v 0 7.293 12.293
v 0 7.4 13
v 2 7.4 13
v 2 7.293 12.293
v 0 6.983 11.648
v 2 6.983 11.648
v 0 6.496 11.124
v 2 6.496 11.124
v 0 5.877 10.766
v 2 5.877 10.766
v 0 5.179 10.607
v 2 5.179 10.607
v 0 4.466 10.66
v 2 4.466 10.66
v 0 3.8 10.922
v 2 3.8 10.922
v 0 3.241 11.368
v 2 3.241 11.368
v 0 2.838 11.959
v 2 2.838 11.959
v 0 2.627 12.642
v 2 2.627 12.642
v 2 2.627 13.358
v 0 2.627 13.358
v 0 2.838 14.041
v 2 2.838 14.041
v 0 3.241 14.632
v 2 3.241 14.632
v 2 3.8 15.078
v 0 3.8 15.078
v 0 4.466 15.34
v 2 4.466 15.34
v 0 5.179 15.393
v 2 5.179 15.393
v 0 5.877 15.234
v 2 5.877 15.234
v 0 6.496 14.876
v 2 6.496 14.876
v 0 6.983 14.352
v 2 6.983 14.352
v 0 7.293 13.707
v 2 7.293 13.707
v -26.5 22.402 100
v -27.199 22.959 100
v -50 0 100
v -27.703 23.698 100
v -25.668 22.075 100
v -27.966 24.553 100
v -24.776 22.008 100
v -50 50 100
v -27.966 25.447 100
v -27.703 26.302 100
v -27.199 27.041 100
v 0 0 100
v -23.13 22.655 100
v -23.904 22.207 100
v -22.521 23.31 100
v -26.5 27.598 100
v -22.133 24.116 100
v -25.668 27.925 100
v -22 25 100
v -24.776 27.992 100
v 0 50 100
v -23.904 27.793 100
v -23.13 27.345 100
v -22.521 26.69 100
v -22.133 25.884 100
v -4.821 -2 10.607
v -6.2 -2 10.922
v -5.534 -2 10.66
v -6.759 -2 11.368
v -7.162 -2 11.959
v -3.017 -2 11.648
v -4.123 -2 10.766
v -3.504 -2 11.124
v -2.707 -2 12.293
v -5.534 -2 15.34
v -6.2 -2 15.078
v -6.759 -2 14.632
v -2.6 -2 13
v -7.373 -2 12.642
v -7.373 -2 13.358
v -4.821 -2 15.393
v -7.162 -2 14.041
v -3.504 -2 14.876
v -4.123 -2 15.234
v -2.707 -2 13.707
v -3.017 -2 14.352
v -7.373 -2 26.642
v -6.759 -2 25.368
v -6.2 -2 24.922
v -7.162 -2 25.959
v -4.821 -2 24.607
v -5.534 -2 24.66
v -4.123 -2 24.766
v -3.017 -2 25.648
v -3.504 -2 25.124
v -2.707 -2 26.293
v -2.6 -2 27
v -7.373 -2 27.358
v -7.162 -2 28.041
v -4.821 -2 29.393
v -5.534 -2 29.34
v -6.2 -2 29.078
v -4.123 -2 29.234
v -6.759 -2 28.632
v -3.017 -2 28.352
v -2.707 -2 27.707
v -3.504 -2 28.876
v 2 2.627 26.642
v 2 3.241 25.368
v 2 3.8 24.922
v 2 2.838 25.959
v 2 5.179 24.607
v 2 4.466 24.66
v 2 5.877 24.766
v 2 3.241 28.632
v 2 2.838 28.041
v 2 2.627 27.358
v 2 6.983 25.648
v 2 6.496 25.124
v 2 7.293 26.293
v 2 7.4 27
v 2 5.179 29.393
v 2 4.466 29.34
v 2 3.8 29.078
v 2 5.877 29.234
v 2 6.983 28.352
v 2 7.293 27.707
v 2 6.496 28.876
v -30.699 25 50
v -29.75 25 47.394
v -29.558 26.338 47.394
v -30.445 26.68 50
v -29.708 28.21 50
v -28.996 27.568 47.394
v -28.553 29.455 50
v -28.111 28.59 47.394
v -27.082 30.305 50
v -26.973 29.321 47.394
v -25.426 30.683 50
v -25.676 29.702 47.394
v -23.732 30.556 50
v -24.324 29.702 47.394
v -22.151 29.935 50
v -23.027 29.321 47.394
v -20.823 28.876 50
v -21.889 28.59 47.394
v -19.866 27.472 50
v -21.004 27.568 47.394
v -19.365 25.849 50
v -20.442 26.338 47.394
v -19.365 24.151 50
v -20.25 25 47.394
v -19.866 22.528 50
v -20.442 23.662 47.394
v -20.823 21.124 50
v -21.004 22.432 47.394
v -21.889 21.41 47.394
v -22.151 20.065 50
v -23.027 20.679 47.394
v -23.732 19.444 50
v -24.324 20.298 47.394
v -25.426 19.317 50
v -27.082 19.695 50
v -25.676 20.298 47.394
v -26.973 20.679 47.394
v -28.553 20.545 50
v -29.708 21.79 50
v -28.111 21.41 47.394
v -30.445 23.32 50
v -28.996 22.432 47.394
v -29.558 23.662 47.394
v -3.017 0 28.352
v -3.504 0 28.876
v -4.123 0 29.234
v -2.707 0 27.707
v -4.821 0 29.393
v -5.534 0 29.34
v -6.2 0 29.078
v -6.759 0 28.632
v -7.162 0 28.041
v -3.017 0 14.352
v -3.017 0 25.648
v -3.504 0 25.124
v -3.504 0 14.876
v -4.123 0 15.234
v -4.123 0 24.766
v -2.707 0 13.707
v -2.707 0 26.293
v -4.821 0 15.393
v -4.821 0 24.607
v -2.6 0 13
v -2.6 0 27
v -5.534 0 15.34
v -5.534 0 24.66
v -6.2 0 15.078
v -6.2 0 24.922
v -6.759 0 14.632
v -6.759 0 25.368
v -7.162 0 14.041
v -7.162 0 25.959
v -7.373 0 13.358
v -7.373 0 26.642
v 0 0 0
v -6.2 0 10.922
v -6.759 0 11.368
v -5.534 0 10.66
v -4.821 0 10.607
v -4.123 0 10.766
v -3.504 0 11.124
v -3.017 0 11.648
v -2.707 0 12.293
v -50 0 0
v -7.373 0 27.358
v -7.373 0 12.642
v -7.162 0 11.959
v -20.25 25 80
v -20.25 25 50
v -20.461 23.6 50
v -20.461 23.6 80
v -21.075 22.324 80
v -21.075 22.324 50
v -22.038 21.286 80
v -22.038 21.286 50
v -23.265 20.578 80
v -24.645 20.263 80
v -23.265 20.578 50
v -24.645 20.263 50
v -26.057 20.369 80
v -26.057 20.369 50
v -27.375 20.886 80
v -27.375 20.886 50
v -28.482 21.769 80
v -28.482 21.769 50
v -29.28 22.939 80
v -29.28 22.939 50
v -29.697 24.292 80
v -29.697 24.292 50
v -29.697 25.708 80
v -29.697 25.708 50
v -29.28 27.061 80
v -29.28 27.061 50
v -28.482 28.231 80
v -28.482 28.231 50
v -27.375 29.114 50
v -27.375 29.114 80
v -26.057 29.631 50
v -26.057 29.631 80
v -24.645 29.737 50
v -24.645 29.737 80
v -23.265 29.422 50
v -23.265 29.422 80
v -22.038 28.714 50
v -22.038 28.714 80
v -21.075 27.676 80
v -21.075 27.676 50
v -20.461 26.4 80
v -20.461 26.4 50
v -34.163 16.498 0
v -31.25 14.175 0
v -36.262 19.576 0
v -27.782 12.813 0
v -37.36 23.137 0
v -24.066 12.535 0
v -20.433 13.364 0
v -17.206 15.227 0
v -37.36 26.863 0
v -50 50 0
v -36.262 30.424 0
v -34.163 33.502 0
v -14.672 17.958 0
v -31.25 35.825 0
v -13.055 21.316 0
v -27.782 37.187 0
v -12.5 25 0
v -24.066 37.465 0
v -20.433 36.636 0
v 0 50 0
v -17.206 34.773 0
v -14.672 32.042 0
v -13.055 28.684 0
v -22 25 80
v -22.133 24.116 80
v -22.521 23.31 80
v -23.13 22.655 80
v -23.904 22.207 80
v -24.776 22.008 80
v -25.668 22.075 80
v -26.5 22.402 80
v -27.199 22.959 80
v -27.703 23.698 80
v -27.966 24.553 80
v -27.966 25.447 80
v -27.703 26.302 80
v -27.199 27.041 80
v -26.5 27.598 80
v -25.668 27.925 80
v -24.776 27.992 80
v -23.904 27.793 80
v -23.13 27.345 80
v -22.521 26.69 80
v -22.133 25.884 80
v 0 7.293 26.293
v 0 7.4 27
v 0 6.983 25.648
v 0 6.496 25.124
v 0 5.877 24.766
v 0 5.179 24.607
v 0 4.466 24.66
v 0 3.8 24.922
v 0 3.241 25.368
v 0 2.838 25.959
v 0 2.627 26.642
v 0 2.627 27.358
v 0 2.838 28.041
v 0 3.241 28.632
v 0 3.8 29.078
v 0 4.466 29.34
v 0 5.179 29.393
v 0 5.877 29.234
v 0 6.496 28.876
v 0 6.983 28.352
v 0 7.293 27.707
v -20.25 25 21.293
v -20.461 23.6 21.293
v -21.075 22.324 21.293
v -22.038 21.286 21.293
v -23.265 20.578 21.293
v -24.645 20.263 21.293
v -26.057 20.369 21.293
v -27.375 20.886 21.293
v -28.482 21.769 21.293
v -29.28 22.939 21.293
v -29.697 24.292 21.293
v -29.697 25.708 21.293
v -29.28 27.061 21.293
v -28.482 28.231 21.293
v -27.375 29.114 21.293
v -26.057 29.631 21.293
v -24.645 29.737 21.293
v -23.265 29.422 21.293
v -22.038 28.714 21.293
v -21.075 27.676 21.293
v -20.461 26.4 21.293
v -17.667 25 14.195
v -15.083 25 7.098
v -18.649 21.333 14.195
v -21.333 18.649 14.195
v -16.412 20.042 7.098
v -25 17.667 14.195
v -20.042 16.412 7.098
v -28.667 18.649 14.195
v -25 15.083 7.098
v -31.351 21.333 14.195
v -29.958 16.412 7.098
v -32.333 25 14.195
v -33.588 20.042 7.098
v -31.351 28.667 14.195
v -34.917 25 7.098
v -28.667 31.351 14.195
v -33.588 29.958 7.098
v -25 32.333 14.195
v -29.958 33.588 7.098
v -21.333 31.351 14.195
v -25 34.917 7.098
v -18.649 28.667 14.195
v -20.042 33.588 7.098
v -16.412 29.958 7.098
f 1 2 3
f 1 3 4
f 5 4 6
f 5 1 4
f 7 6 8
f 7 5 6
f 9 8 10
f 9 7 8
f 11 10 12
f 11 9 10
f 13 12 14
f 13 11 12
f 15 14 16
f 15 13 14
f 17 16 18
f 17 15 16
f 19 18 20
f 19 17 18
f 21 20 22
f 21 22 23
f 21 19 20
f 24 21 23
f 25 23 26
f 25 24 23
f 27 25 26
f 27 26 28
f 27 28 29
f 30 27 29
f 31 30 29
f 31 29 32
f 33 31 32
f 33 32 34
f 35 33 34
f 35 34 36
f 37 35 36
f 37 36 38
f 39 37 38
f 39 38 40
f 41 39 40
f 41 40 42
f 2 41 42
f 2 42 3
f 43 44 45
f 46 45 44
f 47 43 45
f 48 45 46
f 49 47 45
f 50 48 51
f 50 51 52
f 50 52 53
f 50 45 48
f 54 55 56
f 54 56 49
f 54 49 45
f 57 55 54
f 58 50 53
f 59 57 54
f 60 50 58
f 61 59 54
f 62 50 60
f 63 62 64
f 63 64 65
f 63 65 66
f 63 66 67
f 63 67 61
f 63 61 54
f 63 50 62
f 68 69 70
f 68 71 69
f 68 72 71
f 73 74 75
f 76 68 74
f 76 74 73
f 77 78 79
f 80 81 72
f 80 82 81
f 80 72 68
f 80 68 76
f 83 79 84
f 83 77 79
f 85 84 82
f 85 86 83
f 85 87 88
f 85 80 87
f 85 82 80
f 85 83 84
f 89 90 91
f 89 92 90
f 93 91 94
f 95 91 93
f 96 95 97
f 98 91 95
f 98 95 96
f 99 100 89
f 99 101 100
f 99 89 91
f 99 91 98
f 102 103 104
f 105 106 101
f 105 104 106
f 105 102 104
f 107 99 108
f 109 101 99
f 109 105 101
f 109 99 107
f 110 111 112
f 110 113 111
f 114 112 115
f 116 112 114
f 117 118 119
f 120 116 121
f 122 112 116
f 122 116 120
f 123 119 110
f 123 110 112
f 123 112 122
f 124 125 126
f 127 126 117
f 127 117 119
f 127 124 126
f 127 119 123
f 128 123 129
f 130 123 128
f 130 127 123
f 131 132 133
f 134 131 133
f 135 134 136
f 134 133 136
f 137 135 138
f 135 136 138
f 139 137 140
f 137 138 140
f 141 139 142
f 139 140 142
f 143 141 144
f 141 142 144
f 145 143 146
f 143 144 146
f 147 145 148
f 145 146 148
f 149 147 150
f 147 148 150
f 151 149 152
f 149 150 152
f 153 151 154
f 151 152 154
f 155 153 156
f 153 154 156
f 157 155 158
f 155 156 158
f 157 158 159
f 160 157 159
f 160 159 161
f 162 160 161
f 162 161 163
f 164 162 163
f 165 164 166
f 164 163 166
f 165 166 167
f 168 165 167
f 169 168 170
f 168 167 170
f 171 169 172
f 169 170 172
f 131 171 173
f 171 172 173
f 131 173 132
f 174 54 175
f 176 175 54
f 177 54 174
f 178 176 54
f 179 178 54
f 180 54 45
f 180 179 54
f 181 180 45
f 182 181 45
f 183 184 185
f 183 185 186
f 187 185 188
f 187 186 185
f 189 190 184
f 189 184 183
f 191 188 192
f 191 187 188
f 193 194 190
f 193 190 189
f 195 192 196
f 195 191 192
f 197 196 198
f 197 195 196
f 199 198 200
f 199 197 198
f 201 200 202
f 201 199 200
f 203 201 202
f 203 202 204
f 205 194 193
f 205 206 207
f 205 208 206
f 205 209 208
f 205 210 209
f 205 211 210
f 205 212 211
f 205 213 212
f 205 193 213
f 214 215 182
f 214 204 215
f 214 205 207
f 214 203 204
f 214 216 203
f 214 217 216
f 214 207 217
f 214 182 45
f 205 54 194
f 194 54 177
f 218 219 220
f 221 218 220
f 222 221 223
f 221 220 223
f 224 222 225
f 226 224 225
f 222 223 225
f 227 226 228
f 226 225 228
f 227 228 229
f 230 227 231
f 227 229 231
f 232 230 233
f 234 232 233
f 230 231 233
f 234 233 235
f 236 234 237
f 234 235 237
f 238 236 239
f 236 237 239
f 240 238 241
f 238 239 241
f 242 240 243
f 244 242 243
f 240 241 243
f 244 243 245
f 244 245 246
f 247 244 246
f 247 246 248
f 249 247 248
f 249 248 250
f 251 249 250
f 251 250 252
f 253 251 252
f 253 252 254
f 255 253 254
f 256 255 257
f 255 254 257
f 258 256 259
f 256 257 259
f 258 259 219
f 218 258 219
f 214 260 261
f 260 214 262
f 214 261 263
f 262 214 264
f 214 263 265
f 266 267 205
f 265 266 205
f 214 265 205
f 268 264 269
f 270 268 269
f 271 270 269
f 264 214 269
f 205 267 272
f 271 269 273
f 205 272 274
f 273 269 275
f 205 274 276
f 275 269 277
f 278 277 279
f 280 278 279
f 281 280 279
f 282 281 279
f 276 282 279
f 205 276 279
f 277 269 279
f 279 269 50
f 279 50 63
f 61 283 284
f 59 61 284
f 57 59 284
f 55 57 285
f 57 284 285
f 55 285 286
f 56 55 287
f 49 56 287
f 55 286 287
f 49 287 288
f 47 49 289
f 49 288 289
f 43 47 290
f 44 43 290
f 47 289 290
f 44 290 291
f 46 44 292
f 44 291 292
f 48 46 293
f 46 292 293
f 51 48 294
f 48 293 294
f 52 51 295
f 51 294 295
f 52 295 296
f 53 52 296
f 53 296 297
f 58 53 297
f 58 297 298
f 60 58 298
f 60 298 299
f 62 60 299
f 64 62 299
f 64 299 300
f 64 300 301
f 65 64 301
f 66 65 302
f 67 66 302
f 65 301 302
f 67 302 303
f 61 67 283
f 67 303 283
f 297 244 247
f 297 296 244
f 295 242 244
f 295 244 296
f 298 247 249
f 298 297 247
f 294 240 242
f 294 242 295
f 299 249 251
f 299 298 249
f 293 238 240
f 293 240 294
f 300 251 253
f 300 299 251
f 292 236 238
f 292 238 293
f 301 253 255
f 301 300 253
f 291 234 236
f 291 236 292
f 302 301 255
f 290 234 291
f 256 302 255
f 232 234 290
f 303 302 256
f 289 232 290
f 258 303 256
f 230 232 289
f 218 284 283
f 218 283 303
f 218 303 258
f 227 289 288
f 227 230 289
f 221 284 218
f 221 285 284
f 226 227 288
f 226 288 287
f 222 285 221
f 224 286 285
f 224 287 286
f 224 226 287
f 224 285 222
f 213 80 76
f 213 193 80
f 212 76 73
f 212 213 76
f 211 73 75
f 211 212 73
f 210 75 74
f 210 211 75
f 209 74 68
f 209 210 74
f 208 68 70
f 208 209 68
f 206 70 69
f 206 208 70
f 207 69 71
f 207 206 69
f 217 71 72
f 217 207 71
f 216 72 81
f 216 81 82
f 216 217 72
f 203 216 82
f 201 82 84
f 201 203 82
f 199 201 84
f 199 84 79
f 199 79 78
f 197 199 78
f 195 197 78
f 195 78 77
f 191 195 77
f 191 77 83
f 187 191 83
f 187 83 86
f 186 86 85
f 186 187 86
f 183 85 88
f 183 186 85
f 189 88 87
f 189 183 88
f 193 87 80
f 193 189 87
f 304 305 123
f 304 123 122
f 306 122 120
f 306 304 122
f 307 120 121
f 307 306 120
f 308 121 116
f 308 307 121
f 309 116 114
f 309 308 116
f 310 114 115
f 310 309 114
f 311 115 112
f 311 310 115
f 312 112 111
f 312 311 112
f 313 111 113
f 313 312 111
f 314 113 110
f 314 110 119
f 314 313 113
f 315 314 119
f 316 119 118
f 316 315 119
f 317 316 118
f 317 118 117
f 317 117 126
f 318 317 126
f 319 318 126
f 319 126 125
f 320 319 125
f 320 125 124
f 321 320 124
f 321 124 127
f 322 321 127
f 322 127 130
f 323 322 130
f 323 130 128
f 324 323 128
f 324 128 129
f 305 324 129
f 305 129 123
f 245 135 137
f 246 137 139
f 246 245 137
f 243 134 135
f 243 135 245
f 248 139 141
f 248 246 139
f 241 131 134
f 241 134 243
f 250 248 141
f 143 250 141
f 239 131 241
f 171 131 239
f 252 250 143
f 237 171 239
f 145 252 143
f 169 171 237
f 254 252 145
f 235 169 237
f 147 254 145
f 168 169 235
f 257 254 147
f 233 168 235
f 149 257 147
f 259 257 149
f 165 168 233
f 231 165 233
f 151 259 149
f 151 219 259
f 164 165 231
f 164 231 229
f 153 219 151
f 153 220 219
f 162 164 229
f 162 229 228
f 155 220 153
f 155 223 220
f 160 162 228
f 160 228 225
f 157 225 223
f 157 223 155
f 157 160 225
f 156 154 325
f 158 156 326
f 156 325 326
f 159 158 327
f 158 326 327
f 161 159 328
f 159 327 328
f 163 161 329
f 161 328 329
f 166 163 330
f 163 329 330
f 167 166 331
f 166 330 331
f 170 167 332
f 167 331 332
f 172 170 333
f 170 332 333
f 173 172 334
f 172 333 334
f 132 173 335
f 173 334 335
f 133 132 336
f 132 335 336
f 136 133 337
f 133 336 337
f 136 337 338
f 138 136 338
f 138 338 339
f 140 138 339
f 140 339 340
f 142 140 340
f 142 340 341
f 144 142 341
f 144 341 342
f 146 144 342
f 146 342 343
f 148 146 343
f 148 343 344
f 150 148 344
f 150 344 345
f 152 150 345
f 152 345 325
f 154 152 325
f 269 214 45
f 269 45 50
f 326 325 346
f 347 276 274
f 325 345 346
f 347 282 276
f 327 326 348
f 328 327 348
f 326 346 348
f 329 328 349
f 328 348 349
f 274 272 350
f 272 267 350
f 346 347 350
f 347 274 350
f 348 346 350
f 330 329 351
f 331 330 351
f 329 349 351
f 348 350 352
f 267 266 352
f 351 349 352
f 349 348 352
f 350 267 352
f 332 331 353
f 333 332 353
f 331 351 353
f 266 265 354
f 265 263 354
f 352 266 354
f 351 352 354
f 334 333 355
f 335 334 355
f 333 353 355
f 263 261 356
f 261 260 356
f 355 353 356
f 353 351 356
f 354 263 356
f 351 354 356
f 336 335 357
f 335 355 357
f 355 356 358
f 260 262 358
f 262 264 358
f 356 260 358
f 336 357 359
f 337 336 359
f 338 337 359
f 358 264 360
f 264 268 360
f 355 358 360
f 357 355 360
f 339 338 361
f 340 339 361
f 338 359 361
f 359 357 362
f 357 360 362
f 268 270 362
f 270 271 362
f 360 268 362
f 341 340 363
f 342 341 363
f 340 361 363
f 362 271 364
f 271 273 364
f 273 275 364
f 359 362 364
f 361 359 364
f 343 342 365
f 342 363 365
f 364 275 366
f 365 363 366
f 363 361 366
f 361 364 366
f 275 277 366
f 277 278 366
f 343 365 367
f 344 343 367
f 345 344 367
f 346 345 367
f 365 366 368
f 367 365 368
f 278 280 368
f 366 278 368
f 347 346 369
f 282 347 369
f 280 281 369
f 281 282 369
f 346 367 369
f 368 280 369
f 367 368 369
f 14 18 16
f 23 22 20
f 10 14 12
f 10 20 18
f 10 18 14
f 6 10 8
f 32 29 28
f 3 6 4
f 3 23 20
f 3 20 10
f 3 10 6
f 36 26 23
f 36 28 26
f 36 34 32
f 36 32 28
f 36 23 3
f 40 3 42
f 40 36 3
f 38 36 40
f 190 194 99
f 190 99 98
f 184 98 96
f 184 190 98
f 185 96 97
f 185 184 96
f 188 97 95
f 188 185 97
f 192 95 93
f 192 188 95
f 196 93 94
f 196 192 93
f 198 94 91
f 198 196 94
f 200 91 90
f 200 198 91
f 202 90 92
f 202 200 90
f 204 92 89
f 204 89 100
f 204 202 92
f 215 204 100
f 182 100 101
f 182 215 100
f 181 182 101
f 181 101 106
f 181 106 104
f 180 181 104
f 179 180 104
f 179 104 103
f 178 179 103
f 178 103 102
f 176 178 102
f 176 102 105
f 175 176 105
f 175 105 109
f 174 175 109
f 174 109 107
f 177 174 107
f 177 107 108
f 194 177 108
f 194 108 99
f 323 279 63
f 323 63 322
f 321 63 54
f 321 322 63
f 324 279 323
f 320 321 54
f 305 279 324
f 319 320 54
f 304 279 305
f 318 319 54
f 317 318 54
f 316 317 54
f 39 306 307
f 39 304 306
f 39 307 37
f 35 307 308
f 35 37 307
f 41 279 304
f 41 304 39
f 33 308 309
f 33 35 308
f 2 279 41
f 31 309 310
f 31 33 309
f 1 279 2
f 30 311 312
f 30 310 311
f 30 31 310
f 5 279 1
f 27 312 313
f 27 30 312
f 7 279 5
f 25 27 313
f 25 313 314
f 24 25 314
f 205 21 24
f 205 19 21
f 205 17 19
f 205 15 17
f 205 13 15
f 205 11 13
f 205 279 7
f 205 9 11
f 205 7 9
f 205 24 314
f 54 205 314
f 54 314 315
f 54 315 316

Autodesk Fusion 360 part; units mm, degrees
sketch "Sketch1" plane through (0, 0, 0) normal (0, 0, 1) x (1, 0, 0)
  line L0 (0, 0) -> (-50, 0)
  line L1 (-50, 0) -> (-50, 50)
  line L2 (-50, 50) -> (0, 50)
  line L3 (0, 50) -> (0, 0)
  dimension "d1" = 50
  dimension "d2" = 50
extrude "Extrude1" add sketch "Sketch1" along normal blind 100
ref_plane "WorkPlane1" through (-25, 25, 0) normal (0, 0, -1) x (-1, 0, 0)
sketch "Sketch2" plane through (-25, 25, 0) normal (0, 0, -1) x (1, 0, 0)
  circle A0 centre (0, 0) radius 12.5
  dimension "d6" = 25
extrude "Extrude2" cut sketch "Sketch2" against normal blind 50 draft -20
sketch "Sketch3" plane through (0, 0, 0) normal (0, 0, -1) x (1, 0, 0)
  circle A0 centre (-25, -25) radius 12.5
  line L0 (-50, -50) -> (0, -50)
  line L1 (0, -50) -> (0, 0)
  line L2 (0, 0) -> (-50, 0)
  line L3 (-50, 0) -> (-50, -50)
ref_plane "WorkPlane2" through (-25, 25, 0) normal (0, 0, -1) x (1, 0, 0)
sketch "Sketch4" plane through (0, 0, 0) normal (0, 0, -1) x (1, 0, 0)
  circle A0 centre (-25, -25) radius 3
  circle A1 centre (-25, -25) radius 4.75
  dimension "d10" = 6
  dimension "d11" = 9.5
extrude "Extrude3" cut sketch "Sketch4" against normal blind 100 contours A0
sketch "Sketch5" plane through (-25, 25, 0) normal (0, 0, -1) x (1, 0, 0)
  circle A0 centre (0, 0) radius 4.75
  dimension "d14" = 9.5
extrude "Extrude4" cut sketch "Sketch5" against normal blind 80
sketch "Sketch6" plane through (0, 0, 0) normal (0, 0, -1) x (1, 0, 0)
ref_plane "WorkPlane3" through (0, 25, 50) normal (1, 0, 0) x (0, 1, 0)
sketch "Sketch7" plane through (0, 25, 50) normal (1, 0, 0) x (0, 1, 0)
  line L0 (-25, -50) -> (-20, -50)
  line L1 (-20, -50) -> (-20, -37)
  line L2 (-20, -37) -> (-25, -37)
  line L3 (-25, -37) -> (-25, -50)
  line L4 (-25, -37) -> (-20, -37)
  line L5 (-20, -37) -> (-20, -23)
  line L6 (-20, -23) -> (-25, -23)
  line L7 (-25, -23) -> (-25, -37)
  circle A0 centre (-20, -23) radius 2.4
  circle A1 centre (-20, -37) radius 2.4
  dimension "d18" = 5
  dimension "d19" = 13
  dimension "d20" = 5
  dimension "d21" = 14
  dimension "d22" = 4.8
  dimension "d23" = 4.8
extrude "Extrude5" add sketch "Sketch7" along normal blind 2 contours L1 L2 L4 A1 | L1 L5 A1 | L2 L4 L5 A1 | L5 L6 A0 | L5 L6 A0
ref_plane "WorkPlane4" through (-25, 0, 50) normal (0, -1, 0) x (1, 0, 0)
sketch "Sketch8" plane through (-25, 0, 50) normal (0, -1, 0) x (1, 0, 0)
  line L0 (25, -50) -> (20, -50)
  line L1 (20, -50) -> (20, -37)
  line L2 (20, -37) -> (25, -37)
  line L3 (25, -37) -> (25, -50)
  line L4 (25, -37) -> (20, -37)
  line L5 (20, -37) -> (20, -23)
  line L6 (20, -23) -> (25, -23)
  line L7 (25, -23) -> (25, -37)
  circle A0 centre (20, -23) radius 2.4
  circle A1 centre (20, -37) radius 2.4
  dimension "d27" = 4.8
  dimension "d28" = 4.8
extrude "Extrude6" add sketch "Sketch8" along normal blind 2 contours L1 L5 A1 | L1 L2 L4 A1 | L2 L4 L5 A1 | L5 L6 A0 | L5 L6 A0
